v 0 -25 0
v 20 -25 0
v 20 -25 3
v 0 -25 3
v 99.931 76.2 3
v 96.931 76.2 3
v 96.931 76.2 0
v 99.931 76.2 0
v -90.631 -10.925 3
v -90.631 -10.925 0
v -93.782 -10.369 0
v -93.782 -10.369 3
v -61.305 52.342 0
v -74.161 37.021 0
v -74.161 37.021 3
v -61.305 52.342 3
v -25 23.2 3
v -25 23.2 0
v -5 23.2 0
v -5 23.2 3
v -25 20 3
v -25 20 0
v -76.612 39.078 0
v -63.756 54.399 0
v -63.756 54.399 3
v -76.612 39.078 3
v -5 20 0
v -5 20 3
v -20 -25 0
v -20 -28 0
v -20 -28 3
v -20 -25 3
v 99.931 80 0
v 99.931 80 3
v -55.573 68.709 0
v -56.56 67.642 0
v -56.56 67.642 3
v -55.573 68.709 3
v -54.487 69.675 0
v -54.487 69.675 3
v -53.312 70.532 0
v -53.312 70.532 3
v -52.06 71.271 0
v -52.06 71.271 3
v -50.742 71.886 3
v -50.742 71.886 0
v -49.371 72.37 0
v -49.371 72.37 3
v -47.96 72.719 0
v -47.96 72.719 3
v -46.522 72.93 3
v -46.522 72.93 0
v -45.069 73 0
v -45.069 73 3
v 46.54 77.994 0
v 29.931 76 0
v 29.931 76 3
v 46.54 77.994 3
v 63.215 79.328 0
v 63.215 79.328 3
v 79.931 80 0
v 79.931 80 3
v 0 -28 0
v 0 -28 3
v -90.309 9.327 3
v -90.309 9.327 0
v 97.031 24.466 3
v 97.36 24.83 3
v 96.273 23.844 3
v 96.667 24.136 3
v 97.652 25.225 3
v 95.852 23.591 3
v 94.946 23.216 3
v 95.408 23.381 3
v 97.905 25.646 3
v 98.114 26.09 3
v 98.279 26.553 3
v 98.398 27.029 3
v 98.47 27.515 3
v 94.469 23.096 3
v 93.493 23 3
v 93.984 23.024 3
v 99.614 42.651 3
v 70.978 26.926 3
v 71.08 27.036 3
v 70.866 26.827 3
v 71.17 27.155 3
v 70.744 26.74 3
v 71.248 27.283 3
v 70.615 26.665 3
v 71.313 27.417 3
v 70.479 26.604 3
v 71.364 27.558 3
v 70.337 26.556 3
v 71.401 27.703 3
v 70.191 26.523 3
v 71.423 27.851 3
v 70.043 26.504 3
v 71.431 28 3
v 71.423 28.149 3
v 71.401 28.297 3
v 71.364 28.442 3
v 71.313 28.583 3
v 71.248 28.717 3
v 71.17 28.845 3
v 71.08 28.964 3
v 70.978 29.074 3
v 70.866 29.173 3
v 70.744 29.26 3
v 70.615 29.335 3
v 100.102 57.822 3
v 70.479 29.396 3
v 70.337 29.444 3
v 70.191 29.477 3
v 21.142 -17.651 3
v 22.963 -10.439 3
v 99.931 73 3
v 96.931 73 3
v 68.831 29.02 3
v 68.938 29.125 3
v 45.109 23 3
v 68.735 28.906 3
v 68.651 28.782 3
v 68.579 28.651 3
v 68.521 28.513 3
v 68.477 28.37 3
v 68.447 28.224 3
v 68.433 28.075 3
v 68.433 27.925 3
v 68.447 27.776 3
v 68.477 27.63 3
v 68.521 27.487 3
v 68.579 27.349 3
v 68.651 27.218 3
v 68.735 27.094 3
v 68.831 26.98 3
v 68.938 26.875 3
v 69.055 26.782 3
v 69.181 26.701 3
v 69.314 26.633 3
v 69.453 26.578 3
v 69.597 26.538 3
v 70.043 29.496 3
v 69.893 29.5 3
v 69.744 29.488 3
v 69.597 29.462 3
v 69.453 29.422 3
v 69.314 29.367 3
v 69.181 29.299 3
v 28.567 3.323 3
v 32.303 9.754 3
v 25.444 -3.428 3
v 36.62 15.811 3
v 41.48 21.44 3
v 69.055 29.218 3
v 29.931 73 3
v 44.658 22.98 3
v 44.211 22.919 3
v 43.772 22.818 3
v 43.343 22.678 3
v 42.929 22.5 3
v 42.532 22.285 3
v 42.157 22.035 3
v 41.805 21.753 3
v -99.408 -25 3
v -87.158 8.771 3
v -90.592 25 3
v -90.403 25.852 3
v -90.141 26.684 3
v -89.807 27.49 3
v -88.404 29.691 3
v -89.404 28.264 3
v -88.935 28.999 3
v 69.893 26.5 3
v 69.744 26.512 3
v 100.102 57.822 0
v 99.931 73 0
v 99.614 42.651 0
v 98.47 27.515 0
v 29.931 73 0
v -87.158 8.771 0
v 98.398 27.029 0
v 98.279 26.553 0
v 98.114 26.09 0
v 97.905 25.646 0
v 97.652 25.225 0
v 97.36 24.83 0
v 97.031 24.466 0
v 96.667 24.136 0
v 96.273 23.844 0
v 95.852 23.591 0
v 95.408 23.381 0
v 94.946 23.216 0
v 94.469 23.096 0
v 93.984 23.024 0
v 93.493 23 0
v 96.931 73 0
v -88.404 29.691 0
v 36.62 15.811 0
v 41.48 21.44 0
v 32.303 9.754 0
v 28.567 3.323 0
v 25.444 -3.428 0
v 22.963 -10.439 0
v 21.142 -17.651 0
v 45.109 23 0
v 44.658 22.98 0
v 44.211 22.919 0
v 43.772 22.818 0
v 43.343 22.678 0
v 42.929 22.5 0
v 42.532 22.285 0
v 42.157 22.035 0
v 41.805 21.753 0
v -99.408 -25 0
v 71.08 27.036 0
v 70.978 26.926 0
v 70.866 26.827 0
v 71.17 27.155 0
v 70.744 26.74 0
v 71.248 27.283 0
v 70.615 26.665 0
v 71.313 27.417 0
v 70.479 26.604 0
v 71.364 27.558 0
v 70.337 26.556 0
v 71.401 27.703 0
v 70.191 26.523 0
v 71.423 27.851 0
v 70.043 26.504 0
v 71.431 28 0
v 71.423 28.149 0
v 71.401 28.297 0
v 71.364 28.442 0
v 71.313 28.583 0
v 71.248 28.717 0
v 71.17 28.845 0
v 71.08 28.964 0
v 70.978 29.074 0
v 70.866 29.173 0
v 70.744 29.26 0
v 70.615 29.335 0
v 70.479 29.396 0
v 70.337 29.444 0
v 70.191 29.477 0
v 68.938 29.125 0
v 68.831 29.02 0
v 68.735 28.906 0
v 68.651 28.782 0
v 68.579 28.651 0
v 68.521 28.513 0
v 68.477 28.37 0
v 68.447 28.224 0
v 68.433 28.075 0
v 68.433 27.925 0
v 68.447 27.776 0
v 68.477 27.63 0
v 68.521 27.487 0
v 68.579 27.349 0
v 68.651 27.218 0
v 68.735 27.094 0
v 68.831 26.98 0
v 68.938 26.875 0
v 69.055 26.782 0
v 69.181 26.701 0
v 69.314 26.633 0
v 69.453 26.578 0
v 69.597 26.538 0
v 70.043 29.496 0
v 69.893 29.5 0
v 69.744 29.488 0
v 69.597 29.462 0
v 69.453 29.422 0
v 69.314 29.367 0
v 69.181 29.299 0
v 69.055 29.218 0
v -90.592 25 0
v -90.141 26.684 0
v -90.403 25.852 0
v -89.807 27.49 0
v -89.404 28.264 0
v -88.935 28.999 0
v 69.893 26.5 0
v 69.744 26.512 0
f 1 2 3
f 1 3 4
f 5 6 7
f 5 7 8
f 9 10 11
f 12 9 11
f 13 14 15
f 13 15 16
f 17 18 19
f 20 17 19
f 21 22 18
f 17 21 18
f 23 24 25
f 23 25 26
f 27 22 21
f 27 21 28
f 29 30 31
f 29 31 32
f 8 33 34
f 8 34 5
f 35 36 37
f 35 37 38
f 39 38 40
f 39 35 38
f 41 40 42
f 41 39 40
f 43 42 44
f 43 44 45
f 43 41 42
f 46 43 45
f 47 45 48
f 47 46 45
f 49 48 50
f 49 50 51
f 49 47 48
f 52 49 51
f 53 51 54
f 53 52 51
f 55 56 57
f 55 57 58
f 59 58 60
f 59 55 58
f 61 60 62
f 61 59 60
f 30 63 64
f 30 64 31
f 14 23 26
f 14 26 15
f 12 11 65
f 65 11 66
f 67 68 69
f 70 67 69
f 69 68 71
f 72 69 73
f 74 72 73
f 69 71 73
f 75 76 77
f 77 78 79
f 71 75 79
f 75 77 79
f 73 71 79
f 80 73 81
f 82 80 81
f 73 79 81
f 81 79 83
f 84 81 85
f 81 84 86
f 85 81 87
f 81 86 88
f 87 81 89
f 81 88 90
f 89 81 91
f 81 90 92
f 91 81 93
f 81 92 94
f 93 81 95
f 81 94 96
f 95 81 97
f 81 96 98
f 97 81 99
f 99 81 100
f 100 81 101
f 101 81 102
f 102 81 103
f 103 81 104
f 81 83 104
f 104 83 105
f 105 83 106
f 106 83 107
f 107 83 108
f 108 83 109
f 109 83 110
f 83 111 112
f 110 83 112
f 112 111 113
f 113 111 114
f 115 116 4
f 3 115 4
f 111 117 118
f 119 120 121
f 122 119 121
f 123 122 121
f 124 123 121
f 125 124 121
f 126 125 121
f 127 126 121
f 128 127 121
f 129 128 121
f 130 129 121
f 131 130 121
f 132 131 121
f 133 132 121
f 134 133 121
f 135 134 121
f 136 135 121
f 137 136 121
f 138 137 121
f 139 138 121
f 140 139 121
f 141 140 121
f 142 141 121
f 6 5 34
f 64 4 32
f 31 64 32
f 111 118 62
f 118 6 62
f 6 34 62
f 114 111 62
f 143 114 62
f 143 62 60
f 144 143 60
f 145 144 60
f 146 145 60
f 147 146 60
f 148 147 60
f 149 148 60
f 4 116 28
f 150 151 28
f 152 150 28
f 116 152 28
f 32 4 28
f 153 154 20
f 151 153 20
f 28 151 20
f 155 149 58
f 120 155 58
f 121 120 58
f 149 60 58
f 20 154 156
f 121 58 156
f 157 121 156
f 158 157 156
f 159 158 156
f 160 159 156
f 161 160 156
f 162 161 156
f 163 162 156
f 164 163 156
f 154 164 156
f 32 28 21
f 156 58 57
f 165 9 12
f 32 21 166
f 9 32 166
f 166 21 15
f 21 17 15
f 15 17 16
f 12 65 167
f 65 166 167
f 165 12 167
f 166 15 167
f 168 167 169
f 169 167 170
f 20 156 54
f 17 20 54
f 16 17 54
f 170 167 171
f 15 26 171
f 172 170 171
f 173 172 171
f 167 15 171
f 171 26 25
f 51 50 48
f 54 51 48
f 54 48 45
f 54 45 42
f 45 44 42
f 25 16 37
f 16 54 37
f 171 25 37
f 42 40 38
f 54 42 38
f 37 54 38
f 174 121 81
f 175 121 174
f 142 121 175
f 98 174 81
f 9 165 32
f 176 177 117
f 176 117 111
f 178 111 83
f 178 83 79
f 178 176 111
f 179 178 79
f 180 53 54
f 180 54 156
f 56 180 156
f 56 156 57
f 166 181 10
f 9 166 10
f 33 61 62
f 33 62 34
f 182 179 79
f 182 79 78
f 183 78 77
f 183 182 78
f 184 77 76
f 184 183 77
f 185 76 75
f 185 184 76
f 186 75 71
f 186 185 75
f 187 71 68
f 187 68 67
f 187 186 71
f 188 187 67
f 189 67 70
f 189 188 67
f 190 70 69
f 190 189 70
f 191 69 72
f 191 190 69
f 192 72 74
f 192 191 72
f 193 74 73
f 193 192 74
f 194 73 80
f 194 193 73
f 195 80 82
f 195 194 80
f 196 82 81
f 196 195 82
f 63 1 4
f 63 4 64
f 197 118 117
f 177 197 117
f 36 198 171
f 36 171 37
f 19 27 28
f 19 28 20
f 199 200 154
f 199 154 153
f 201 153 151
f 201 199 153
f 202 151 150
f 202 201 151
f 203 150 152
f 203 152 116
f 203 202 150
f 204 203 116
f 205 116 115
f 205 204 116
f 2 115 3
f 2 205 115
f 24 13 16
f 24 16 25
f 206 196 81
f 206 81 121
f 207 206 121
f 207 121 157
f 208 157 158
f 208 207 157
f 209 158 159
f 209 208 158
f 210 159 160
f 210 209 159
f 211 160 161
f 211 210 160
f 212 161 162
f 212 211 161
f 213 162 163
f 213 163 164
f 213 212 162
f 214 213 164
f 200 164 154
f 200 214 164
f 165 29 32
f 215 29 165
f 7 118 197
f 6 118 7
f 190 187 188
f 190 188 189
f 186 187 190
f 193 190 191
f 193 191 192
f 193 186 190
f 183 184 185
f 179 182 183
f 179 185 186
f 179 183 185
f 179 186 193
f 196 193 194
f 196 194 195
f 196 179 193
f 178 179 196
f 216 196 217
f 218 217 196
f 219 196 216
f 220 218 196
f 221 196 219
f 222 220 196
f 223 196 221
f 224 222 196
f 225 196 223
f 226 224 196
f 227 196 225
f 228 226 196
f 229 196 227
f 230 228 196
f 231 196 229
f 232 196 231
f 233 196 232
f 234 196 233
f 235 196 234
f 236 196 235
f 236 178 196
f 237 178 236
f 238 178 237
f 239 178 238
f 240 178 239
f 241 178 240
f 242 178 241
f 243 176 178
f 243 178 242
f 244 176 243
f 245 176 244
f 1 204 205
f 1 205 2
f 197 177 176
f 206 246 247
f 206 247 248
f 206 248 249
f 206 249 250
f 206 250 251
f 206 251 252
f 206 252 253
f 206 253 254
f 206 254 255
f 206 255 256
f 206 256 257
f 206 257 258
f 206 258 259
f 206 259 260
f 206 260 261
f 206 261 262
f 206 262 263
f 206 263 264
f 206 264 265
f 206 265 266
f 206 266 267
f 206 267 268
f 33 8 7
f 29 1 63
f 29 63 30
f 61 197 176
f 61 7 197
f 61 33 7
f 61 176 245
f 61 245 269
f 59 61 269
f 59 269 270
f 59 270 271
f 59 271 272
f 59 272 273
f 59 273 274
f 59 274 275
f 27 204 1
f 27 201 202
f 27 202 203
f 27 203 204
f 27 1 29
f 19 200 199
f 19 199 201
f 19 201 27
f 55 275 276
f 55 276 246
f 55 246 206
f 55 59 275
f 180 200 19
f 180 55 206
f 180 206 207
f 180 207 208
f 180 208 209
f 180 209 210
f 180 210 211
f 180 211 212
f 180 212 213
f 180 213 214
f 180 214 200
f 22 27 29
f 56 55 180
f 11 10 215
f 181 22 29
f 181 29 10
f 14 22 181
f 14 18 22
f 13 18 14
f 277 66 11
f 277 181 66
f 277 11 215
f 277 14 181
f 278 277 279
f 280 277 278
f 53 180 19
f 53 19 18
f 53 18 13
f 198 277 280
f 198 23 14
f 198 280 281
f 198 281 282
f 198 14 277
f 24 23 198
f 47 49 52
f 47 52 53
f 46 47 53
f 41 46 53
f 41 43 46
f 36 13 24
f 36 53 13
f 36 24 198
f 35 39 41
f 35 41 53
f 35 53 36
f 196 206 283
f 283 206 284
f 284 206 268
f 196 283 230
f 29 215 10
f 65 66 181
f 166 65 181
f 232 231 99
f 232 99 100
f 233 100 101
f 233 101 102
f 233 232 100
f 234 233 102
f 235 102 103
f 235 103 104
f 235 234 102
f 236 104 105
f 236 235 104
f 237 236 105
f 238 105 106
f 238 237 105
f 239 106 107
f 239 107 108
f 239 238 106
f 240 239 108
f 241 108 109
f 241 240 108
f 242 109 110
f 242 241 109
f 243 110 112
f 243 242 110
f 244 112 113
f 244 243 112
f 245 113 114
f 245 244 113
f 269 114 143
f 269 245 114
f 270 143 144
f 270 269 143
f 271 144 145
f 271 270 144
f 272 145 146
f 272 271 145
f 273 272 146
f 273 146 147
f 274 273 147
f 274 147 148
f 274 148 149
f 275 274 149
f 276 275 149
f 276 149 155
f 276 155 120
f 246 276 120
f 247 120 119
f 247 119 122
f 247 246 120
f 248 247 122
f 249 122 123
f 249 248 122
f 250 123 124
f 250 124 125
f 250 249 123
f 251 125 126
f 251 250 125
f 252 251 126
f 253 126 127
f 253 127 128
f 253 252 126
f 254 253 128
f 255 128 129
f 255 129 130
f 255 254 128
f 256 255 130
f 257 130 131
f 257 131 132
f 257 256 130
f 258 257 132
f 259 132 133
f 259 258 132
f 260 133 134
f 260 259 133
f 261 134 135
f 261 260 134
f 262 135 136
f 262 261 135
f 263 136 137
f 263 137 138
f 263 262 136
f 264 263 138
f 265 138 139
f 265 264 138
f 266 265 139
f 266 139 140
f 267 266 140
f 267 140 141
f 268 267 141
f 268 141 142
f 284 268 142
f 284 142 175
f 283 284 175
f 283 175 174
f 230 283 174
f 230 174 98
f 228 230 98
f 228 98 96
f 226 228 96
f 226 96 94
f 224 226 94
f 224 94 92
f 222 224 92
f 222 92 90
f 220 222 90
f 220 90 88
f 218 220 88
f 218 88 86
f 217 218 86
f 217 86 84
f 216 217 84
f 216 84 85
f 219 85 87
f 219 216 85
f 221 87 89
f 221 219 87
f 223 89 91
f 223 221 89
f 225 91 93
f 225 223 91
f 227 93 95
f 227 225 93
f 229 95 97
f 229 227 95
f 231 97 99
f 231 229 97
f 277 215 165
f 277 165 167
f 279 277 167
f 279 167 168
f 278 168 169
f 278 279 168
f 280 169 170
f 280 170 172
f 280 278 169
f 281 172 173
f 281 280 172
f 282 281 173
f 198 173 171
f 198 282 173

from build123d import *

# Parameters (mm, degrees)
SKETCH1_R           = 1.5
SKETCH1_W           = 20
SKETCH1_H           = 3.2
BOSS_EXTRUDE1_DEPTH = 3
SKETCH2_W           = 3
SKETCH2_H           = 3.2
CUT_EXTRUDE1_DEPTH  = 10


with BuildPart() as part:
    # Sketch1 → Boss-Extrude1 (new body)
    with BuildSketch(Plane.XY):
        with BuildLine():
            Line((-45.069342458, 73), (29.930657542, 73))
            Line((29.930657542, 73), (29.930657542, 76))
            ThreePointArc((29.930657542, 76), (54.871173993, 78.743544354), (79.930657542, 80))
            Line((79.930657542, 80), (99.930657542, 80))
            Line((99.930657542, 80), (99.930657542, 73))
            ThreePointArc((99.930657542, 73), (99.94021491, 50.233693089), (98.469664685, 27.514927635))
            ThreePointArc((98.469664685, 27.514927635), (96.852910392, 24.29693628), (93.493249831, 23))
            Line((93.493249831, 23), (45.108726753, 23))
            ThreePointArc((45.108726753, 23), (43.13391621, 22.593487054), (41.480220087, 21.440049327))
            ThreePointArc((41.480220087, 21.440049327), (26.927174582, -0.016353332), (20, -25))
            Line((20, -25), (0, -25))
            Line((0, -25), (0, -27.9998915))
            Line((0, -27.9998915), (-20, -27.9998915))
            Line((-20, -27.9998915), (-20, -25))
            Line((-20, -25), (-99.408174518, -25))
            Line((-99.408174518, -25), (-90.591825482, 25))
            ThreePointArc((-90.591825482, 25), (-89.806825823, 27.489700841), (-88.404192383, 29.69139432))
            Line((-88.404192383, 29.69139432), (-56.560009105, 67.641814145))
            ThreePointArc((-56.560009105, 67.641814145), (-51.408616384, 71.594616806), (-45.069342458, 73))
        make_face()
        with Locations((69.930657542, 28)):
            Circle(SKETCH1_R, mode=Mode.SUBTRACT)
        with Locations((-15, 21.6)):
            Rectangle(SKETCH1_W, SKETCH1_H, mode=Mode.SUBTRACT)
        Polygon((-76.611843512, 39.077796972), (-74.160501294, 37.020876622), (-61.3047491, 52.341765484), (-63.756091318, 54.398685835), align=None, mode=Mode.SUBTRACT)
        Polygon((-93.782058518, -10.369022063), (-90.309094964, 9.327132997), (-87.157710155, 8.771458829), (-90.630673708, -10.924696232), align=None, mode=Mode.SUBTRACT)
    extrude(amount=BOSS_EXTRUDE1_DEPTH)

    # Sketch2 → Cut-Extrude1 (cut)
    with BuildSketch(Plane.XY.offset(3)):
        with Locations((98.430657542, 74.6)):
            Rectangle(SKETCH2_W, SKETCH2_H)
    extrude(amount=-CUT_EXTRUDE1_DEPTH, mode=Mode.SUBTRACT)


solid = part.part
